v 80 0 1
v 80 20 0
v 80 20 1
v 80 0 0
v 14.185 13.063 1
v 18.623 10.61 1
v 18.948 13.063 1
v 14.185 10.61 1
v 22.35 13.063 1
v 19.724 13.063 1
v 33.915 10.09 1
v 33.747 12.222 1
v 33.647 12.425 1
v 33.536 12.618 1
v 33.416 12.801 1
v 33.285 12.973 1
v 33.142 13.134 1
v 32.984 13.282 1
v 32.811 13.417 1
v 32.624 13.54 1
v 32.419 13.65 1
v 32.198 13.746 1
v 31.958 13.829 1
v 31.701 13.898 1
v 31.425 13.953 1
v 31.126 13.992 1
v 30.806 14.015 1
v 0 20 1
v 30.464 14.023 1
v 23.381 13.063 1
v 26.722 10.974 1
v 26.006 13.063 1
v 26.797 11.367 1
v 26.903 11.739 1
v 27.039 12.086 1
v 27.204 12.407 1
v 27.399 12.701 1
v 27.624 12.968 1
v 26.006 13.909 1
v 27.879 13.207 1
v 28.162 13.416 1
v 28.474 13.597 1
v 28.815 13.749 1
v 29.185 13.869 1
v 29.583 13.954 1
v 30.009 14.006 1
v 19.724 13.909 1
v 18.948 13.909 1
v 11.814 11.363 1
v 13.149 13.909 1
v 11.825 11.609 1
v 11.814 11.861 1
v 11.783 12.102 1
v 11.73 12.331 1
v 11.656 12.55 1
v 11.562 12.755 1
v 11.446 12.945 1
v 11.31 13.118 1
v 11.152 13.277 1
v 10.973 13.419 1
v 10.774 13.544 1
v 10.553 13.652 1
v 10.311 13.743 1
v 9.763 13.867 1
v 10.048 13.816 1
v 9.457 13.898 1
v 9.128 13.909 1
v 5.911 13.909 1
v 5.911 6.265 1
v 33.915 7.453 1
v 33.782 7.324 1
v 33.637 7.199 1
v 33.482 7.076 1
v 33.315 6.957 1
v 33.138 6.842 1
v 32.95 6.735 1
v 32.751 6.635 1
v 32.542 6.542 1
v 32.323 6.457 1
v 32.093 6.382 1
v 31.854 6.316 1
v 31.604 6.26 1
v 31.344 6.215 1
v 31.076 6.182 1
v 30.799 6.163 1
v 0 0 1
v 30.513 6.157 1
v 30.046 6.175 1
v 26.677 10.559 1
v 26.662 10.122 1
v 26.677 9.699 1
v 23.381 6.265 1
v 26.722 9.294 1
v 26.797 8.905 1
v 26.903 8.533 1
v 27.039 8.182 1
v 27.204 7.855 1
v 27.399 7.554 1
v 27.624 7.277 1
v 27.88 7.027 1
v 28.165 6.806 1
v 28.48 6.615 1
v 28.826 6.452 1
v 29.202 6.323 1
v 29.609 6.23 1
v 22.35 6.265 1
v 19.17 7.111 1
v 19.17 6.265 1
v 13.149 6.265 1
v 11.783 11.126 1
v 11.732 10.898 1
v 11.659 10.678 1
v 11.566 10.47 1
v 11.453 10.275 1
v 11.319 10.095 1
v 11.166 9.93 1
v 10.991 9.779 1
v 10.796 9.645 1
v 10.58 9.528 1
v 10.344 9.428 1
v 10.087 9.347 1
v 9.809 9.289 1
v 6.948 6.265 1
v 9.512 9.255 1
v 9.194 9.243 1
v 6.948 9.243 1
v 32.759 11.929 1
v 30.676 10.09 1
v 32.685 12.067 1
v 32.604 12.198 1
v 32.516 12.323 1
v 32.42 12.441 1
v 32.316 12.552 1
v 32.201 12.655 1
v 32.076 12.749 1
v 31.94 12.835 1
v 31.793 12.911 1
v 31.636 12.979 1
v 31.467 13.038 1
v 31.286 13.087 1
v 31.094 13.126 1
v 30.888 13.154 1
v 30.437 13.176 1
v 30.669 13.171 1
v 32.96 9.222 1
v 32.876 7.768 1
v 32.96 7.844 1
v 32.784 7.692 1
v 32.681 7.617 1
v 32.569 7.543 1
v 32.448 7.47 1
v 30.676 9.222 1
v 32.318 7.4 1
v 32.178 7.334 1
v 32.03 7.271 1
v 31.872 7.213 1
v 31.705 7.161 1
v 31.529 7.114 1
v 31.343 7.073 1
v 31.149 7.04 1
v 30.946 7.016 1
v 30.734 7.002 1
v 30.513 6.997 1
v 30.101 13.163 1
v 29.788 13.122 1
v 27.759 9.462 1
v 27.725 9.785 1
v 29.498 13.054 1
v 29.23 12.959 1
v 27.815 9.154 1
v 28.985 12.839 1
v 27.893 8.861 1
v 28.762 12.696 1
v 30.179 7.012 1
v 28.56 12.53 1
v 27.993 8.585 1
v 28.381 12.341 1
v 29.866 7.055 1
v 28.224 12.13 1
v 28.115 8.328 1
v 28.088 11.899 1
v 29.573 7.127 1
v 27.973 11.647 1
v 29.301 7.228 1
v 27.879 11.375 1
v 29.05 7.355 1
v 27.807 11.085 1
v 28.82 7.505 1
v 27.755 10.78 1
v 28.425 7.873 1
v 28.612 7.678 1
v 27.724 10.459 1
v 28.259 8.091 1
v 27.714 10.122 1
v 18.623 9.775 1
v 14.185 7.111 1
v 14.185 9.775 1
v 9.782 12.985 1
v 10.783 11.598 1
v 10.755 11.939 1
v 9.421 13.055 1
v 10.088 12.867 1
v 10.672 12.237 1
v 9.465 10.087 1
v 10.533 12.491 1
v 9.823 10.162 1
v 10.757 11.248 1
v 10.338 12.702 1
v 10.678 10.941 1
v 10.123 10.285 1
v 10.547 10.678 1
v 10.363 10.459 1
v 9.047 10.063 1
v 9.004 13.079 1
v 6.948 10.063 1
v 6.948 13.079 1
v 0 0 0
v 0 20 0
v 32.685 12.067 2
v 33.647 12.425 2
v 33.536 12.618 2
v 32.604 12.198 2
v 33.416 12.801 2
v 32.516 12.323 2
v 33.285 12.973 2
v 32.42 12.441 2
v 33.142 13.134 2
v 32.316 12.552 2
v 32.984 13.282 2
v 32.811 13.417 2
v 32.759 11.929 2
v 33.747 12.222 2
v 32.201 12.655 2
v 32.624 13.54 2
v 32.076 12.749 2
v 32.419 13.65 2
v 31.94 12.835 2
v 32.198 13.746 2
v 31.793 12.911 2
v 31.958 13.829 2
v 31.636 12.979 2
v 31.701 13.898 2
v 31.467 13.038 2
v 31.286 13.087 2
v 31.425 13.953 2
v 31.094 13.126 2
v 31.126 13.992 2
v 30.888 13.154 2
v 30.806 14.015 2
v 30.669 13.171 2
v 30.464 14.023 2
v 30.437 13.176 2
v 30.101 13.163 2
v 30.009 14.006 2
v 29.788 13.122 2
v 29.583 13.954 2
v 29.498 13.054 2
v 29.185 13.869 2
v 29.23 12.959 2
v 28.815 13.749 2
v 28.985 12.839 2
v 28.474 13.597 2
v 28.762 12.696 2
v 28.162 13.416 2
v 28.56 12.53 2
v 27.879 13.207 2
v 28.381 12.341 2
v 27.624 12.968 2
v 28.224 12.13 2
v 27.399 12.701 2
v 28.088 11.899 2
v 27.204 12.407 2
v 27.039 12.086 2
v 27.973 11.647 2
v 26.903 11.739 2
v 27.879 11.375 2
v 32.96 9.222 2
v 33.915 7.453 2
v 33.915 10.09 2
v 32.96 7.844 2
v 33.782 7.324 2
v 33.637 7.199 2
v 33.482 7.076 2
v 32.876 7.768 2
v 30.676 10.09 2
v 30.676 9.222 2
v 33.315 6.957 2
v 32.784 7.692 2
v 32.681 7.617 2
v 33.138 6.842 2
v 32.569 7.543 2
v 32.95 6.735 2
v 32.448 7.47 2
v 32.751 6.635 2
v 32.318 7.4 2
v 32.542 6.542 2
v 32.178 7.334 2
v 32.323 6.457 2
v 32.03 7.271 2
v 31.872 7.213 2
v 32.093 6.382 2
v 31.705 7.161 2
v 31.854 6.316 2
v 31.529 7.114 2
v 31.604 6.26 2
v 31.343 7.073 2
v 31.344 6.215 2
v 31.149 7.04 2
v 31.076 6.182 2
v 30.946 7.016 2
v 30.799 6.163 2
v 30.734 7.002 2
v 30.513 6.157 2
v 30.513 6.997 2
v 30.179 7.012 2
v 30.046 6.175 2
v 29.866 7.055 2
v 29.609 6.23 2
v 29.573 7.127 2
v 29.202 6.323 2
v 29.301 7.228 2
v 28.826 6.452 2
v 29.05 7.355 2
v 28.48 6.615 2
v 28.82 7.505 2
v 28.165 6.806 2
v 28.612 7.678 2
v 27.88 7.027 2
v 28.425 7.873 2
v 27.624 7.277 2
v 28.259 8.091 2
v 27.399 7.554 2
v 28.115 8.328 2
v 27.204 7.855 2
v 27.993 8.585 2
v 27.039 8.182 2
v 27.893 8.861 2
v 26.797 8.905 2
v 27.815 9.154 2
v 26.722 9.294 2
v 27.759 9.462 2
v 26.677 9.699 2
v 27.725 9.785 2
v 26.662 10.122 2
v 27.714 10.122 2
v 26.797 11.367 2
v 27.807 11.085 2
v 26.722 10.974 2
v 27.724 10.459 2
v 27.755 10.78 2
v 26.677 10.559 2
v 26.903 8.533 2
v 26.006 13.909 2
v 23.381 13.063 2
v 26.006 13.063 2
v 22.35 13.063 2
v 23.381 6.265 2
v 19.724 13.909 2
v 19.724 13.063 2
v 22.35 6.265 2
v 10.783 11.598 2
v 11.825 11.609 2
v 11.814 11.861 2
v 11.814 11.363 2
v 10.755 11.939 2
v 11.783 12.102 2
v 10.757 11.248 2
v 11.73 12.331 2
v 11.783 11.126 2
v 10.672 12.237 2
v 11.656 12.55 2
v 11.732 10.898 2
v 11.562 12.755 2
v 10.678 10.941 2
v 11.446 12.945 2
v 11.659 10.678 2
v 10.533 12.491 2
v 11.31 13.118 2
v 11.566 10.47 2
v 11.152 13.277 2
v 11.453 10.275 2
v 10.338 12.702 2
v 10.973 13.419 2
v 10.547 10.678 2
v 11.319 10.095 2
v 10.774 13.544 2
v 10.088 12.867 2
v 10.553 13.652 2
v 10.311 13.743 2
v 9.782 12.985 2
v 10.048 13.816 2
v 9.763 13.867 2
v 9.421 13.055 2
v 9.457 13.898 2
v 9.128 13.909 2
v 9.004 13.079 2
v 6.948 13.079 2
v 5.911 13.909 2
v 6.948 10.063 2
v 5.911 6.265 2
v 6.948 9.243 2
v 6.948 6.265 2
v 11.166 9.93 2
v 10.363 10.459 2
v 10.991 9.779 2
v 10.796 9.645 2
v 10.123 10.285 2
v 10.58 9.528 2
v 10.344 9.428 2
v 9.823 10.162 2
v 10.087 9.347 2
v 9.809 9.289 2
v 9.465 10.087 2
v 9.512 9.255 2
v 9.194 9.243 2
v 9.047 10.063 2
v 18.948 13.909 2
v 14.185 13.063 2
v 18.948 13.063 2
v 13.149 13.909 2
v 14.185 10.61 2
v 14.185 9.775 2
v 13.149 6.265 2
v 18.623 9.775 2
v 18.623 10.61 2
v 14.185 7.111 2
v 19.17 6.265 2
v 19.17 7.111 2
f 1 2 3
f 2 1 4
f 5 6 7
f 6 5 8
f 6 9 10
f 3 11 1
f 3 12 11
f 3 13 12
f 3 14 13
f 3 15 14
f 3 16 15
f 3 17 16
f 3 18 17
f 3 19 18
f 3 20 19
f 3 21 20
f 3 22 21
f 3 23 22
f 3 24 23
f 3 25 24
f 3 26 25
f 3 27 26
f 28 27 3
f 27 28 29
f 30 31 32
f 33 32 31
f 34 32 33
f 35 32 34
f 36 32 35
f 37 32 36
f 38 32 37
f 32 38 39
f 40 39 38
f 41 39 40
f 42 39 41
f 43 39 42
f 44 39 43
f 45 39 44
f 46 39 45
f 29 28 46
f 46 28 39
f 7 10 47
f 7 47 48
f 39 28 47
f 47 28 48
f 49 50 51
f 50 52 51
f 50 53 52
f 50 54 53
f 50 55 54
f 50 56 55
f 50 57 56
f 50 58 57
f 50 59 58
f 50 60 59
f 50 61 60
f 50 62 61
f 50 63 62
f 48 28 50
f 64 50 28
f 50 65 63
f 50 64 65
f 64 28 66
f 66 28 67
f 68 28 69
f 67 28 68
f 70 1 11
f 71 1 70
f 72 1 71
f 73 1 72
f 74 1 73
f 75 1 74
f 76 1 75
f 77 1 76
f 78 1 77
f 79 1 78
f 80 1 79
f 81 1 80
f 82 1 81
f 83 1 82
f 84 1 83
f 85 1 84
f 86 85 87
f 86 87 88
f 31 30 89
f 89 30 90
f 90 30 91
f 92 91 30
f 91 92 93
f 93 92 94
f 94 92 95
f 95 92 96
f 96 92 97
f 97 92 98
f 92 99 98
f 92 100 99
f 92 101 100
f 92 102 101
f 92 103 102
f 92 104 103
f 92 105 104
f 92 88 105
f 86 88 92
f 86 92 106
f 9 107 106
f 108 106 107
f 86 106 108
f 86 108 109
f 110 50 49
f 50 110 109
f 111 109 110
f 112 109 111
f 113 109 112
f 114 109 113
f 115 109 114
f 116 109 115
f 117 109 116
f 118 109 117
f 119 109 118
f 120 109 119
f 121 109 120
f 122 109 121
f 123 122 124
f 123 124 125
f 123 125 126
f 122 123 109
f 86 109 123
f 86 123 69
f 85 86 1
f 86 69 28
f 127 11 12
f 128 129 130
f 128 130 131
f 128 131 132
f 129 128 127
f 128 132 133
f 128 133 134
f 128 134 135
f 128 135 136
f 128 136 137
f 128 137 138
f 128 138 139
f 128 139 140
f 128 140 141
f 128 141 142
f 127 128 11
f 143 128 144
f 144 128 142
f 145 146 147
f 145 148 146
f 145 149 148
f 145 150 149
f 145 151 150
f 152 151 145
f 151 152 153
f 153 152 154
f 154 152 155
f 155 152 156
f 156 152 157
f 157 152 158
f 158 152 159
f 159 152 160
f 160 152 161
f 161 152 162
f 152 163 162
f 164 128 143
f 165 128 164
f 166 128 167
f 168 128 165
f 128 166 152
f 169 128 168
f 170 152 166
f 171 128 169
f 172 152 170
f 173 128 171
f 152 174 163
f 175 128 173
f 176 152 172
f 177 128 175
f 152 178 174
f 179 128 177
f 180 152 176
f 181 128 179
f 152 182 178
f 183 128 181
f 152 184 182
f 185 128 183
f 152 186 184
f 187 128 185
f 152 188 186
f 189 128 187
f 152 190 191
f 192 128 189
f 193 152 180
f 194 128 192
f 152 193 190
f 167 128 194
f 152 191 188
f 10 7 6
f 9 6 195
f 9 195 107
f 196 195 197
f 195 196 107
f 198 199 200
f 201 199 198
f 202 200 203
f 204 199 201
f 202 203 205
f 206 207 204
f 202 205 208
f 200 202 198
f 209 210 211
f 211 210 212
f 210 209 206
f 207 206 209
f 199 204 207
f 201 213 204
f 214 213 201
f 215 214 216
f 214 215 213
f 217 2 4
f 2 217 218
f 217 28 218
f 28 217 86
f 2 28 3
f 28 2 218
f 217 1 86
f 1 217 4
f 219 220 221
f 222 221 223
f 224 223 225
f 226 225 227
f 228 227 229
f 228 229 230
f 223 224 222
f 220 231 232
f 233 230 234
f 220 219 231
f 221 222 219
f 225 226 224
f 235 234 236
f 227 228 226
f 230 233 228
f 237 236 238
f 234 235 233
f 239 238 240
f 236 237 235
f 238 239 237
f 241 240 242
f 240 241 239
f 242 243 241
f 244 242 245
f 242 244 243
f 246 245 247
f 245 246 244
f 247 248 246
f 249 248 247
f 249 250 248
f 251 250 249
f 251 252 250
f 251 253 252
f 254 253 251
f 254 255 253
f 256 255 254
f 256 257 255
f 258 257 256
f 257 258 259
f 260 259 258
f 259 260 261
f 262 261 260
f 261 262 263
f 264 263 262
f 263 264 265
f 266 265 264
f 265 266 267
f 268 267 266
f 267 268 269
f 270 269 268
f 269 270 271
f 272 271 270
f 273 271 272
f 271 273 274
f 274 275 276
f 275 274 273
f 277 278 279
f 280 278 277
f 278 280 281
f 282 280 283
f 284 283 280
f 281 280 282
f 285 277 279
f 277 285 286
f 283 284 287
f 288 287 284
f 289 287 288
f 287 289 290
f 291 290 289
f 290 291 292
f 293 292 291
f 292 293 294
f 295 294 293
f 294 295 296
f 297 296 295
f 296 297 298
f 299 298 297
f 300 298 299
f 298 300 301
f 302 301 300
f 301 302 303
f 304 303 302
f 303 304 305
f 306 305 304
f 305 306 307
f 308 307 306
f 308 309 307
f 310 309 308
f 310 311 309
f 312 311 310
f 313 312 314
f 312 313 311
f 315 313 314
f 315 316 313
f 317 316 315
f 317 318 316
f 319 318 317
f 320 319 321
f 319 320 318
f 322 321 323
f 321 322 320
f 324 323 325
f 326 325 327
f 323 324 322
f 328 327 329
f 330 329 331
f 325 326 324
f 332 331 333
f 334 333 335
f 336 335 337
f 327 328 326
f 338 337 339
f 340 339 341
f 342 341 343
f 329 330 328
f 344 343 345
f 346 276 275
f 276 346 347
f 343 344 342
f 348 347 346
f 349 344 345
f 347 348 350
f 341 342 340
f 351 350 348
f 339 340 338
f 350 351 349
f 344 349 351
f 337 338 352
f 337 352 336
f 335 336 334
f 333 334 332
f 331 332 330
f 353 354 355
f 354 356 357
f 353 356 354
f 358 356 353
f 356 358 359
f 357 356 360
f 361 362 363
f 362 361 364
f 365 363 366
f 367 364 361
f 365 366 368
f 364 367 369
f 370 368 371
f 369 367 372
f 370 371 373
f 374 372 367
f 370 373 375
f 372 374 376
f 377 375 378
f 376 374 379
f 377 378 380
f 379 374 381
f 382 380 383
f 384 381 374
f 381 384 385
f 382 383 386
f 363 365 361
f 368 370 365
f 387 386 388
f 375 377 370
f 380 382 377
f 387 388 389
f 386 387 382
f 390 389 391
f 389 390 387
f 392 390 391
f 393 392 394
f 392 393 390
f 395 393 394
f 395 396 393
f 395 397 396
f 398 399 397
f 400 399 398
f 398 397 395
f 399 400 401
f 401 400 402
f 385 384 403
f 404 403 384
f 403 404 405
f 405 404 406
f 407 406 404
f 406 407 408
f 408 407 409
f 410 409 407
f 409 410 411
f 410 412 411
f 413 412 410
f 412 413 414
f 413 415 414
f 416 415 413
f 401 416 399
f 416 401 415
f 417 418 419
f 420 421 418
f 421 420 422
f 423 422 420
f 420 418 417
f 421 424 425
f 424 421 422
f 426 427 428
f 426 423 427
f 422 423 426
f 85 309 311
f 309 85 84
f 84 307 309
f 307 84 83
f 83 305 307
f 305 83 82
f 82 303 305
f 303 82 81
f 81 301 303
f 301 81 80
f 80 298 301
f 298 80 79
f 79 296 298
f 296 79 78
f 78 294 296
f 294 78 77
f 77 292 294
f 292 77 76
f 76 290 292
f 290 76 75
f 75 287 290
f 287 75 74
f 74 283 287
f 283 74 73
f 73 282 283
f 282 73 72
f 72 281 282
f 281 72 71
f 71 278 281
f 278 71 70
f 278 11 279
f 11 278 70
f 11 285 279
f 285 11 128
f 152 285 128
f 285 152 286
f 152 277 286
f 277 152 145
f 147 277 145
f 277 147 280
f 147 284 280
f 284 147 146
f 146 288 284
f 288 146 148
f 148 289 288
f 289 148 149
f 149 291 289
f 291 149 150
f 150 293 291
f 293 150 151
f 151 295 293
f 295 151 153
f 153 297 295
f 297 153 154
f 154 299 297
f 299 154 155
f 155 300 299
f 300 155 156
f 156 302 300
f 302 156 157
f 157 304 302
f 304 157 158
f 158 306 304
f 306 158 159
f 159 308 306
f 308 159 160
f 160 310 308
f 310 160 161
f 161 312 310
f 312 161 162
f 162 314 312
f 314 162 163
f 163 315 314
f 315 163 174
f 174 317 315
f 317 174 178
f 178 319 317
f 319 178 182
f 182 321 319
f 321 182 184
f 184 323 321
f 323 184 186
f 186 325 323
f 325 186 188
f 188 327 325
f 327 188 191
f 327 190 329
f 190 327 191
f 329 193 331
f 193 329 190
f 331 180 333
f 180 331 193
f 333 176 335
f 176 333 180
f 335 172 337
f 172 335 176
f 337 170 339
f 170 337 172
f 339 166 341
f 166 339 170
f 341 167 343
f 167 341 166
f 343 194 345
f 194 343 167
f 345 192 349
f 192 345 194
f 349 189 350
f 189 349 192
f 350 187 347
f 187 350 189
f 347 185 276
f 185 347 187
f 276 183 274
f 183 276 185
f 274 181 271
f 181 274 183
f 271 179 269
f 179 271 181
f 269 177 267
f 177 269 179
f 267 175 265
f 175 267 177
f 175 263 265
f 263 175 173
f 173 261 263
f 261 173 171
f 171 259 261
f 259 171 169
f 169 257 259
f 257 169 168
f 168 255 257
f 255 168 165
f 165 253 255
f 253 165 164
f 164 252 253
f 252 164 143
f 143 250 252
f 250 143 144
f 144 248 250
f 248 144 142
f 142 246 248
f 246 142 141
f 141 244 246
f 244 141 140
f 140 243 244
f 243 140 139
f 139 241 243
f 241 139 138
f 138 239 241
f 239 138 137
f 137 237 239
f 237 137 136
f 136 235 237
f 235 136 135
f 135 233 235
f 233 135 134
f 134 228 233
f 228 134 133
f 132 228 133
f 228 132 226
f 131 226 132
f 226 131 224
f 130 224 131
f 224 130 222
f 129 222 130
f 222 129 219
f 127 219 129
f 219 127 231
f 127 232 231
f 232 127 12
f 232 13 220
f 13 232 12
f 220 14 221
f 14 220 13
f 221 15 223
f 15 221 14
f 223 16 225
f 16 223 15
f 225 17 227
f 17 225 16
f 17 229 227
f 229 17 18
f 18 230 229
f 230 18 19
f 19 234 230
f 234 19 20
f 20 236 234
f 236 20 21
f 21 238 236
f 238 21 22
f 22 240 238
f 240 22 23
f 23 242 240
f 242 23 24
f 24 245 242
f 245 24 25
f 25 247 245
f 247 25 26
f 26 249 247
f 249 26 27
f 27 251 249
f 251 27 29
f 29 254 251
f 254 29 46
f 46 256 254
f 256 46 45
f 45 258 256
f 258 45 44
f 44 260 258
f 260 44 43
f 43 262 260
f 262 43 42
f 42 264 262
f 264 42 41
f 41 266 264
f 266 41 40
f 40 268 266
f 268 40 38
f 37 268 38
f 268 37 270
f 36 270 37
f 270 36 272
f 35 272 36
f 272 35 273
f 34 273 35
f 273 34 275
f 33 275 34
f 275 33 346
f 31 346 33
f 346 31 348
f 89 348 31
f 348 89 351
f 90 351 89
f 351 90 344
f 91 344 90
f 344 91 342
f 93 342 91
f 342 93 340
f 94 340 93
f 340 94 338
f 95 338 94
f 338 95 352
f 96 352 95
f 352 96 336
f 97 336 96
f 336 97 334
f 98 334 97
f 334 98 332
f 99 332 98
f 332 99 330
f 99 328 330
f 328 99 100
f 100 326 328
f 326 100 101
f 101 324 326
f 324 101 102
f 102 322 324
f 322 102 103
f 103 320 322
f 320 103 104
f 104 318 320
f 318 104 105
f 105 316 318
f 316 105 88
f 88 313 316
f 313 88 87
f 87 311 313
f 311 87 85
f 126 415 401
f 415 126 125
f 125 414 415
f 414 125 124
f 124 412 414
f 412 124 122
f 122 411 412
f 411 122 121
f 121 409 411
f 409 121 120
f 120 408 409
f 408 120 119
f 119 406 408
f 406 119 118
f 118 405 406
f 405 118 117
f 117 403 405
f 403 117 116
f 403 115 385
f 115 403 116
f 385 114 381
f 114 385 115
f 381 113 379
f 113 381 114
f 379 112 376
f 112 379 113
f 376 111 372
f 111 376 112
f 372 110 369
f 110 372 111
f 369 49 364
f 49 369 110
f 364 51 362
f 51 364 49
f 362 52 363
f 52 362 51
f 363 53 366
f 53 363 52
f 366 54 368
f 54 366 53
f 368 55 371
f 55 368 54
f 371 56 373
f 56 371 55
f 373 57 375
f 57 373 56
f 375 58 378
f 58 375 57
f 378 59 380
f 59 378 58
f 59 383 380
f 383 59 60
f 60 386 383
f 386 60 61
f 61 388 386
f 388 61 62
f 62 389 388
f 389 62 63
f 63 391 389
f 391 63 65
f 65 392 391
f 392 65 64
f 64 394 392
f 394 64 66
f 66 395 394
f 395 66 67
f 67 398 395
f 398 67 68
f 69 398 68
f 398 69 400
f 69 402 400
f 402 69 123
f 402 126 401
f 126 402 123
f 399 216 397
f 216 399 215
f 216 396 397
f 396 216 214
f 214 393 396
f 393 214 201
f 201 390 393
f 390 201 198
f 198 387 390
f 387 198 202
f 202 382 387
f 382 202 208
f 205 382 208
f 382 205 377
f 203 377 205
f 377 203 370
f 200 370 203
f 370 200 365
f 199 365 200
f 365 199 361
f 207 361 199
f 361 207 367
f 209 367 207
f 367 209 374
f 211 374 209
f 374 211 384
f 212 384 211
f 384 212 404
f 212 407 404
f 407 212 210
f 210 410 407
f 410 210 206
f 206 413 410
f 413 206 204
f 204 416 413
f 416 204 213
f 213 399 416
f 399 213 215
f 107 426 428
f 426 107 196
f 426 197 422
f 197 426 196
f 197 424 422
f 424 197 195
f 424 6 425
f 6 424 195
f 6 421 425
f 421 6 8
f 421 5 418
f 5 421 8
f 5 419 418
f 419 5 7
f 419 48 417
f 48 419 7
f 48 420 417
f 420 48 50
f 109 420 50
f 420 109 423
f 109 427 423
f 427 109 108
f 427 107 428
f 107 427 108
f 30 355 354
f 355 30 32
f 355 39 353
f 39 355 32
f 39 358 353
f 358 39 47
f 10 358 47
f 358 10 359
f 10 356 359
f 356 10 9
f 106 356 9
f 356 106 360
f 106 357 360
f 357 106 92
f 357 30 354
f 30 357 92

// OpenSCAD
material="PETG";
x=80;
y=20;

cube([x, y, 1]);
translate([5, y/2, 1]) linear_extrude(height=1) text(material, size=8, valign="center");
